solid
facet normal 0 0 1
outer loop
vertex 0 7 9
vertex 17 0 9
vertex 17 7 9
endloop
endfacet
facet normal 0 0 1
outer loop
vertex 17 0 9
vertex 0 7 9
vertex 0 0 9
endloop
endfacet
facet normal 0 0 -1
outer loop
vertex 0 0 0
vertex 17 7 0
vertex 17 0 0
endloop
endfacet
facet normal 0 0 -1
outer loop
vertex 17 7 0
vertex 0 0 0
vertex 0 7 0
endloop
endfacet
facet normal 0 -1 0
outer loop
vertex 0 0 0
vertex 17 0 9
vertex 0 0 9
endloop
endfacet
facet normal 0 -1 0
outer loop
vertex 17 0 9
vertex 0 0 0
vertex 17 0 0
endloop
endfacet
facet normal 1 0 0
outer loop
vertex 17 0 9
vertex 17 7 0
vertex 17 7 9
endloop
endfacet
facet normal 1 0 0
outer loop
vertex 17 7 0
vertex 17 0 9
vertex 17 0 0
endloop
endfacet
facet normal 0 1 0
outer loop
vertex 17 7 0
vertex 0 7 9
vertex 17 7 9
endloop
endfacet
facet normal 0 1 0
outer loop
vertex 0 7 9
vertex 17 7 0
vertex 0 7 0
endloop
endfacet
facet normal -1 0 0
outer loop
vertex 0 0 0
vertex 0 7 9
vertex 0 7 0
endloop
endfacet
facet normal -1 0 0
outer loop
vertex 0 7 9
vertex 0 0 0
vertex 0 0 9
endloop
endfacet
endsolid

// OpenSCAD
// Generated by SolidPython 1.0.1 on 2020-07-29 00:46:56


cube(size = [17, 7, 9]);
/***********************************************
*********      SolidPython code:      **********
************************************************
 
# import packages: SolidPython
from solid import *
from solid.utils import *
from itertools import chain, combinations, permutations


class Resize:

    def __init__(self, scad_file):
        self.scad_file = scad_file
        #self.scad_file = import_scad(scad_file)
        # cone/cylinder param:
        self.r1 = 0
        self.r2 = 0
        self.h = 0
        # rectangular prism param:
        self.w = 0
        self.l = 0
        # ellipse param:
        self.r = 0

    # import OpenScad code (file name corresponds to shape)


    # classify shape + parameters
    def assign(self, param1, param2, param3):
        if self.scad_file == 'cone.scad':
            self.r1 = param1
            self.r2 = param2
            self.h = param3
        elif self.scad_file == 'cylinder.scad':
            self.r1 = param1
            self.r2 = param2
            self.h = param3
        elif self.scad_file == 'rectangularPrism.scad':
            self.h = param1
            self.l = param2
            self.w = param3
        else:
            self.r = param1
            self.h = param2

    # resize parameters
    def iterate(self):
        x = range(3, 20, 2)
        i = 1
        if self.scad_file == 'cone.scad':
            tempList = list(permutations(x, 2))
            for temp in tempList:
                param1 = temp[0]
                param2 = temp[1]
                filepath = 'produced_scad_files/' + 'cone' + str(param1) + '_' + str(param2) + '_' + '.scad'
                scad_render_to_file(cylinder(h=param1, r1=param2, r2=0), filepath)

        elif self.scad_file == 'cylinder.scad':
            tempList = list(permutations(x, 3))
            for temp in tempList:
                param1 = temp[0]
                param2 = temp[1]
                filepath = 'produced_scad_files/' + 'cylinder' + str(param1) + '_' + str(param2) + '_' + '.scad'
                scad_render_to_file(cylinder(h=param1, r1=param2, r2=param2), filepath)

        elif self.scad_file == 'rectangularPrism.scad':
            tempList = list(permutations(x, 3))
            for temp in tempList:
                param1 = temp[0]
                param2 = temp[1]
                param3 = temp[2]
                filepath = 'produced_scad_files/' + 'rectangularPrism' + str(param1) + '_' + str(param2) + '_' + str(
                    param3) + '.scad'
                scad_render_to_file(cube(size=(param1, param2, param3)), filepath)

        elif self.scad_file == 'ellipse.scad':
            tempList = list(permutations(x, 4))
            for temp in tempList:
                param1 = temp[0]
                param2 = temp[1]
                param3 = temp[2]
                param4 = temp[3]
                filepath = 'produced_scad_files/' + 'ellipse' + str(param1) + '_' + str(param2) + '_' + str(param3) + '_' + str(param4) + '.scad'
                scad_render_to_file(scale([param1, param2, param3])(sphere(r=param4)), filepath)

    def render_to_scadfile(self):
        scad_render_to_file(scad, 'example.scad') 
 
************************************************/
